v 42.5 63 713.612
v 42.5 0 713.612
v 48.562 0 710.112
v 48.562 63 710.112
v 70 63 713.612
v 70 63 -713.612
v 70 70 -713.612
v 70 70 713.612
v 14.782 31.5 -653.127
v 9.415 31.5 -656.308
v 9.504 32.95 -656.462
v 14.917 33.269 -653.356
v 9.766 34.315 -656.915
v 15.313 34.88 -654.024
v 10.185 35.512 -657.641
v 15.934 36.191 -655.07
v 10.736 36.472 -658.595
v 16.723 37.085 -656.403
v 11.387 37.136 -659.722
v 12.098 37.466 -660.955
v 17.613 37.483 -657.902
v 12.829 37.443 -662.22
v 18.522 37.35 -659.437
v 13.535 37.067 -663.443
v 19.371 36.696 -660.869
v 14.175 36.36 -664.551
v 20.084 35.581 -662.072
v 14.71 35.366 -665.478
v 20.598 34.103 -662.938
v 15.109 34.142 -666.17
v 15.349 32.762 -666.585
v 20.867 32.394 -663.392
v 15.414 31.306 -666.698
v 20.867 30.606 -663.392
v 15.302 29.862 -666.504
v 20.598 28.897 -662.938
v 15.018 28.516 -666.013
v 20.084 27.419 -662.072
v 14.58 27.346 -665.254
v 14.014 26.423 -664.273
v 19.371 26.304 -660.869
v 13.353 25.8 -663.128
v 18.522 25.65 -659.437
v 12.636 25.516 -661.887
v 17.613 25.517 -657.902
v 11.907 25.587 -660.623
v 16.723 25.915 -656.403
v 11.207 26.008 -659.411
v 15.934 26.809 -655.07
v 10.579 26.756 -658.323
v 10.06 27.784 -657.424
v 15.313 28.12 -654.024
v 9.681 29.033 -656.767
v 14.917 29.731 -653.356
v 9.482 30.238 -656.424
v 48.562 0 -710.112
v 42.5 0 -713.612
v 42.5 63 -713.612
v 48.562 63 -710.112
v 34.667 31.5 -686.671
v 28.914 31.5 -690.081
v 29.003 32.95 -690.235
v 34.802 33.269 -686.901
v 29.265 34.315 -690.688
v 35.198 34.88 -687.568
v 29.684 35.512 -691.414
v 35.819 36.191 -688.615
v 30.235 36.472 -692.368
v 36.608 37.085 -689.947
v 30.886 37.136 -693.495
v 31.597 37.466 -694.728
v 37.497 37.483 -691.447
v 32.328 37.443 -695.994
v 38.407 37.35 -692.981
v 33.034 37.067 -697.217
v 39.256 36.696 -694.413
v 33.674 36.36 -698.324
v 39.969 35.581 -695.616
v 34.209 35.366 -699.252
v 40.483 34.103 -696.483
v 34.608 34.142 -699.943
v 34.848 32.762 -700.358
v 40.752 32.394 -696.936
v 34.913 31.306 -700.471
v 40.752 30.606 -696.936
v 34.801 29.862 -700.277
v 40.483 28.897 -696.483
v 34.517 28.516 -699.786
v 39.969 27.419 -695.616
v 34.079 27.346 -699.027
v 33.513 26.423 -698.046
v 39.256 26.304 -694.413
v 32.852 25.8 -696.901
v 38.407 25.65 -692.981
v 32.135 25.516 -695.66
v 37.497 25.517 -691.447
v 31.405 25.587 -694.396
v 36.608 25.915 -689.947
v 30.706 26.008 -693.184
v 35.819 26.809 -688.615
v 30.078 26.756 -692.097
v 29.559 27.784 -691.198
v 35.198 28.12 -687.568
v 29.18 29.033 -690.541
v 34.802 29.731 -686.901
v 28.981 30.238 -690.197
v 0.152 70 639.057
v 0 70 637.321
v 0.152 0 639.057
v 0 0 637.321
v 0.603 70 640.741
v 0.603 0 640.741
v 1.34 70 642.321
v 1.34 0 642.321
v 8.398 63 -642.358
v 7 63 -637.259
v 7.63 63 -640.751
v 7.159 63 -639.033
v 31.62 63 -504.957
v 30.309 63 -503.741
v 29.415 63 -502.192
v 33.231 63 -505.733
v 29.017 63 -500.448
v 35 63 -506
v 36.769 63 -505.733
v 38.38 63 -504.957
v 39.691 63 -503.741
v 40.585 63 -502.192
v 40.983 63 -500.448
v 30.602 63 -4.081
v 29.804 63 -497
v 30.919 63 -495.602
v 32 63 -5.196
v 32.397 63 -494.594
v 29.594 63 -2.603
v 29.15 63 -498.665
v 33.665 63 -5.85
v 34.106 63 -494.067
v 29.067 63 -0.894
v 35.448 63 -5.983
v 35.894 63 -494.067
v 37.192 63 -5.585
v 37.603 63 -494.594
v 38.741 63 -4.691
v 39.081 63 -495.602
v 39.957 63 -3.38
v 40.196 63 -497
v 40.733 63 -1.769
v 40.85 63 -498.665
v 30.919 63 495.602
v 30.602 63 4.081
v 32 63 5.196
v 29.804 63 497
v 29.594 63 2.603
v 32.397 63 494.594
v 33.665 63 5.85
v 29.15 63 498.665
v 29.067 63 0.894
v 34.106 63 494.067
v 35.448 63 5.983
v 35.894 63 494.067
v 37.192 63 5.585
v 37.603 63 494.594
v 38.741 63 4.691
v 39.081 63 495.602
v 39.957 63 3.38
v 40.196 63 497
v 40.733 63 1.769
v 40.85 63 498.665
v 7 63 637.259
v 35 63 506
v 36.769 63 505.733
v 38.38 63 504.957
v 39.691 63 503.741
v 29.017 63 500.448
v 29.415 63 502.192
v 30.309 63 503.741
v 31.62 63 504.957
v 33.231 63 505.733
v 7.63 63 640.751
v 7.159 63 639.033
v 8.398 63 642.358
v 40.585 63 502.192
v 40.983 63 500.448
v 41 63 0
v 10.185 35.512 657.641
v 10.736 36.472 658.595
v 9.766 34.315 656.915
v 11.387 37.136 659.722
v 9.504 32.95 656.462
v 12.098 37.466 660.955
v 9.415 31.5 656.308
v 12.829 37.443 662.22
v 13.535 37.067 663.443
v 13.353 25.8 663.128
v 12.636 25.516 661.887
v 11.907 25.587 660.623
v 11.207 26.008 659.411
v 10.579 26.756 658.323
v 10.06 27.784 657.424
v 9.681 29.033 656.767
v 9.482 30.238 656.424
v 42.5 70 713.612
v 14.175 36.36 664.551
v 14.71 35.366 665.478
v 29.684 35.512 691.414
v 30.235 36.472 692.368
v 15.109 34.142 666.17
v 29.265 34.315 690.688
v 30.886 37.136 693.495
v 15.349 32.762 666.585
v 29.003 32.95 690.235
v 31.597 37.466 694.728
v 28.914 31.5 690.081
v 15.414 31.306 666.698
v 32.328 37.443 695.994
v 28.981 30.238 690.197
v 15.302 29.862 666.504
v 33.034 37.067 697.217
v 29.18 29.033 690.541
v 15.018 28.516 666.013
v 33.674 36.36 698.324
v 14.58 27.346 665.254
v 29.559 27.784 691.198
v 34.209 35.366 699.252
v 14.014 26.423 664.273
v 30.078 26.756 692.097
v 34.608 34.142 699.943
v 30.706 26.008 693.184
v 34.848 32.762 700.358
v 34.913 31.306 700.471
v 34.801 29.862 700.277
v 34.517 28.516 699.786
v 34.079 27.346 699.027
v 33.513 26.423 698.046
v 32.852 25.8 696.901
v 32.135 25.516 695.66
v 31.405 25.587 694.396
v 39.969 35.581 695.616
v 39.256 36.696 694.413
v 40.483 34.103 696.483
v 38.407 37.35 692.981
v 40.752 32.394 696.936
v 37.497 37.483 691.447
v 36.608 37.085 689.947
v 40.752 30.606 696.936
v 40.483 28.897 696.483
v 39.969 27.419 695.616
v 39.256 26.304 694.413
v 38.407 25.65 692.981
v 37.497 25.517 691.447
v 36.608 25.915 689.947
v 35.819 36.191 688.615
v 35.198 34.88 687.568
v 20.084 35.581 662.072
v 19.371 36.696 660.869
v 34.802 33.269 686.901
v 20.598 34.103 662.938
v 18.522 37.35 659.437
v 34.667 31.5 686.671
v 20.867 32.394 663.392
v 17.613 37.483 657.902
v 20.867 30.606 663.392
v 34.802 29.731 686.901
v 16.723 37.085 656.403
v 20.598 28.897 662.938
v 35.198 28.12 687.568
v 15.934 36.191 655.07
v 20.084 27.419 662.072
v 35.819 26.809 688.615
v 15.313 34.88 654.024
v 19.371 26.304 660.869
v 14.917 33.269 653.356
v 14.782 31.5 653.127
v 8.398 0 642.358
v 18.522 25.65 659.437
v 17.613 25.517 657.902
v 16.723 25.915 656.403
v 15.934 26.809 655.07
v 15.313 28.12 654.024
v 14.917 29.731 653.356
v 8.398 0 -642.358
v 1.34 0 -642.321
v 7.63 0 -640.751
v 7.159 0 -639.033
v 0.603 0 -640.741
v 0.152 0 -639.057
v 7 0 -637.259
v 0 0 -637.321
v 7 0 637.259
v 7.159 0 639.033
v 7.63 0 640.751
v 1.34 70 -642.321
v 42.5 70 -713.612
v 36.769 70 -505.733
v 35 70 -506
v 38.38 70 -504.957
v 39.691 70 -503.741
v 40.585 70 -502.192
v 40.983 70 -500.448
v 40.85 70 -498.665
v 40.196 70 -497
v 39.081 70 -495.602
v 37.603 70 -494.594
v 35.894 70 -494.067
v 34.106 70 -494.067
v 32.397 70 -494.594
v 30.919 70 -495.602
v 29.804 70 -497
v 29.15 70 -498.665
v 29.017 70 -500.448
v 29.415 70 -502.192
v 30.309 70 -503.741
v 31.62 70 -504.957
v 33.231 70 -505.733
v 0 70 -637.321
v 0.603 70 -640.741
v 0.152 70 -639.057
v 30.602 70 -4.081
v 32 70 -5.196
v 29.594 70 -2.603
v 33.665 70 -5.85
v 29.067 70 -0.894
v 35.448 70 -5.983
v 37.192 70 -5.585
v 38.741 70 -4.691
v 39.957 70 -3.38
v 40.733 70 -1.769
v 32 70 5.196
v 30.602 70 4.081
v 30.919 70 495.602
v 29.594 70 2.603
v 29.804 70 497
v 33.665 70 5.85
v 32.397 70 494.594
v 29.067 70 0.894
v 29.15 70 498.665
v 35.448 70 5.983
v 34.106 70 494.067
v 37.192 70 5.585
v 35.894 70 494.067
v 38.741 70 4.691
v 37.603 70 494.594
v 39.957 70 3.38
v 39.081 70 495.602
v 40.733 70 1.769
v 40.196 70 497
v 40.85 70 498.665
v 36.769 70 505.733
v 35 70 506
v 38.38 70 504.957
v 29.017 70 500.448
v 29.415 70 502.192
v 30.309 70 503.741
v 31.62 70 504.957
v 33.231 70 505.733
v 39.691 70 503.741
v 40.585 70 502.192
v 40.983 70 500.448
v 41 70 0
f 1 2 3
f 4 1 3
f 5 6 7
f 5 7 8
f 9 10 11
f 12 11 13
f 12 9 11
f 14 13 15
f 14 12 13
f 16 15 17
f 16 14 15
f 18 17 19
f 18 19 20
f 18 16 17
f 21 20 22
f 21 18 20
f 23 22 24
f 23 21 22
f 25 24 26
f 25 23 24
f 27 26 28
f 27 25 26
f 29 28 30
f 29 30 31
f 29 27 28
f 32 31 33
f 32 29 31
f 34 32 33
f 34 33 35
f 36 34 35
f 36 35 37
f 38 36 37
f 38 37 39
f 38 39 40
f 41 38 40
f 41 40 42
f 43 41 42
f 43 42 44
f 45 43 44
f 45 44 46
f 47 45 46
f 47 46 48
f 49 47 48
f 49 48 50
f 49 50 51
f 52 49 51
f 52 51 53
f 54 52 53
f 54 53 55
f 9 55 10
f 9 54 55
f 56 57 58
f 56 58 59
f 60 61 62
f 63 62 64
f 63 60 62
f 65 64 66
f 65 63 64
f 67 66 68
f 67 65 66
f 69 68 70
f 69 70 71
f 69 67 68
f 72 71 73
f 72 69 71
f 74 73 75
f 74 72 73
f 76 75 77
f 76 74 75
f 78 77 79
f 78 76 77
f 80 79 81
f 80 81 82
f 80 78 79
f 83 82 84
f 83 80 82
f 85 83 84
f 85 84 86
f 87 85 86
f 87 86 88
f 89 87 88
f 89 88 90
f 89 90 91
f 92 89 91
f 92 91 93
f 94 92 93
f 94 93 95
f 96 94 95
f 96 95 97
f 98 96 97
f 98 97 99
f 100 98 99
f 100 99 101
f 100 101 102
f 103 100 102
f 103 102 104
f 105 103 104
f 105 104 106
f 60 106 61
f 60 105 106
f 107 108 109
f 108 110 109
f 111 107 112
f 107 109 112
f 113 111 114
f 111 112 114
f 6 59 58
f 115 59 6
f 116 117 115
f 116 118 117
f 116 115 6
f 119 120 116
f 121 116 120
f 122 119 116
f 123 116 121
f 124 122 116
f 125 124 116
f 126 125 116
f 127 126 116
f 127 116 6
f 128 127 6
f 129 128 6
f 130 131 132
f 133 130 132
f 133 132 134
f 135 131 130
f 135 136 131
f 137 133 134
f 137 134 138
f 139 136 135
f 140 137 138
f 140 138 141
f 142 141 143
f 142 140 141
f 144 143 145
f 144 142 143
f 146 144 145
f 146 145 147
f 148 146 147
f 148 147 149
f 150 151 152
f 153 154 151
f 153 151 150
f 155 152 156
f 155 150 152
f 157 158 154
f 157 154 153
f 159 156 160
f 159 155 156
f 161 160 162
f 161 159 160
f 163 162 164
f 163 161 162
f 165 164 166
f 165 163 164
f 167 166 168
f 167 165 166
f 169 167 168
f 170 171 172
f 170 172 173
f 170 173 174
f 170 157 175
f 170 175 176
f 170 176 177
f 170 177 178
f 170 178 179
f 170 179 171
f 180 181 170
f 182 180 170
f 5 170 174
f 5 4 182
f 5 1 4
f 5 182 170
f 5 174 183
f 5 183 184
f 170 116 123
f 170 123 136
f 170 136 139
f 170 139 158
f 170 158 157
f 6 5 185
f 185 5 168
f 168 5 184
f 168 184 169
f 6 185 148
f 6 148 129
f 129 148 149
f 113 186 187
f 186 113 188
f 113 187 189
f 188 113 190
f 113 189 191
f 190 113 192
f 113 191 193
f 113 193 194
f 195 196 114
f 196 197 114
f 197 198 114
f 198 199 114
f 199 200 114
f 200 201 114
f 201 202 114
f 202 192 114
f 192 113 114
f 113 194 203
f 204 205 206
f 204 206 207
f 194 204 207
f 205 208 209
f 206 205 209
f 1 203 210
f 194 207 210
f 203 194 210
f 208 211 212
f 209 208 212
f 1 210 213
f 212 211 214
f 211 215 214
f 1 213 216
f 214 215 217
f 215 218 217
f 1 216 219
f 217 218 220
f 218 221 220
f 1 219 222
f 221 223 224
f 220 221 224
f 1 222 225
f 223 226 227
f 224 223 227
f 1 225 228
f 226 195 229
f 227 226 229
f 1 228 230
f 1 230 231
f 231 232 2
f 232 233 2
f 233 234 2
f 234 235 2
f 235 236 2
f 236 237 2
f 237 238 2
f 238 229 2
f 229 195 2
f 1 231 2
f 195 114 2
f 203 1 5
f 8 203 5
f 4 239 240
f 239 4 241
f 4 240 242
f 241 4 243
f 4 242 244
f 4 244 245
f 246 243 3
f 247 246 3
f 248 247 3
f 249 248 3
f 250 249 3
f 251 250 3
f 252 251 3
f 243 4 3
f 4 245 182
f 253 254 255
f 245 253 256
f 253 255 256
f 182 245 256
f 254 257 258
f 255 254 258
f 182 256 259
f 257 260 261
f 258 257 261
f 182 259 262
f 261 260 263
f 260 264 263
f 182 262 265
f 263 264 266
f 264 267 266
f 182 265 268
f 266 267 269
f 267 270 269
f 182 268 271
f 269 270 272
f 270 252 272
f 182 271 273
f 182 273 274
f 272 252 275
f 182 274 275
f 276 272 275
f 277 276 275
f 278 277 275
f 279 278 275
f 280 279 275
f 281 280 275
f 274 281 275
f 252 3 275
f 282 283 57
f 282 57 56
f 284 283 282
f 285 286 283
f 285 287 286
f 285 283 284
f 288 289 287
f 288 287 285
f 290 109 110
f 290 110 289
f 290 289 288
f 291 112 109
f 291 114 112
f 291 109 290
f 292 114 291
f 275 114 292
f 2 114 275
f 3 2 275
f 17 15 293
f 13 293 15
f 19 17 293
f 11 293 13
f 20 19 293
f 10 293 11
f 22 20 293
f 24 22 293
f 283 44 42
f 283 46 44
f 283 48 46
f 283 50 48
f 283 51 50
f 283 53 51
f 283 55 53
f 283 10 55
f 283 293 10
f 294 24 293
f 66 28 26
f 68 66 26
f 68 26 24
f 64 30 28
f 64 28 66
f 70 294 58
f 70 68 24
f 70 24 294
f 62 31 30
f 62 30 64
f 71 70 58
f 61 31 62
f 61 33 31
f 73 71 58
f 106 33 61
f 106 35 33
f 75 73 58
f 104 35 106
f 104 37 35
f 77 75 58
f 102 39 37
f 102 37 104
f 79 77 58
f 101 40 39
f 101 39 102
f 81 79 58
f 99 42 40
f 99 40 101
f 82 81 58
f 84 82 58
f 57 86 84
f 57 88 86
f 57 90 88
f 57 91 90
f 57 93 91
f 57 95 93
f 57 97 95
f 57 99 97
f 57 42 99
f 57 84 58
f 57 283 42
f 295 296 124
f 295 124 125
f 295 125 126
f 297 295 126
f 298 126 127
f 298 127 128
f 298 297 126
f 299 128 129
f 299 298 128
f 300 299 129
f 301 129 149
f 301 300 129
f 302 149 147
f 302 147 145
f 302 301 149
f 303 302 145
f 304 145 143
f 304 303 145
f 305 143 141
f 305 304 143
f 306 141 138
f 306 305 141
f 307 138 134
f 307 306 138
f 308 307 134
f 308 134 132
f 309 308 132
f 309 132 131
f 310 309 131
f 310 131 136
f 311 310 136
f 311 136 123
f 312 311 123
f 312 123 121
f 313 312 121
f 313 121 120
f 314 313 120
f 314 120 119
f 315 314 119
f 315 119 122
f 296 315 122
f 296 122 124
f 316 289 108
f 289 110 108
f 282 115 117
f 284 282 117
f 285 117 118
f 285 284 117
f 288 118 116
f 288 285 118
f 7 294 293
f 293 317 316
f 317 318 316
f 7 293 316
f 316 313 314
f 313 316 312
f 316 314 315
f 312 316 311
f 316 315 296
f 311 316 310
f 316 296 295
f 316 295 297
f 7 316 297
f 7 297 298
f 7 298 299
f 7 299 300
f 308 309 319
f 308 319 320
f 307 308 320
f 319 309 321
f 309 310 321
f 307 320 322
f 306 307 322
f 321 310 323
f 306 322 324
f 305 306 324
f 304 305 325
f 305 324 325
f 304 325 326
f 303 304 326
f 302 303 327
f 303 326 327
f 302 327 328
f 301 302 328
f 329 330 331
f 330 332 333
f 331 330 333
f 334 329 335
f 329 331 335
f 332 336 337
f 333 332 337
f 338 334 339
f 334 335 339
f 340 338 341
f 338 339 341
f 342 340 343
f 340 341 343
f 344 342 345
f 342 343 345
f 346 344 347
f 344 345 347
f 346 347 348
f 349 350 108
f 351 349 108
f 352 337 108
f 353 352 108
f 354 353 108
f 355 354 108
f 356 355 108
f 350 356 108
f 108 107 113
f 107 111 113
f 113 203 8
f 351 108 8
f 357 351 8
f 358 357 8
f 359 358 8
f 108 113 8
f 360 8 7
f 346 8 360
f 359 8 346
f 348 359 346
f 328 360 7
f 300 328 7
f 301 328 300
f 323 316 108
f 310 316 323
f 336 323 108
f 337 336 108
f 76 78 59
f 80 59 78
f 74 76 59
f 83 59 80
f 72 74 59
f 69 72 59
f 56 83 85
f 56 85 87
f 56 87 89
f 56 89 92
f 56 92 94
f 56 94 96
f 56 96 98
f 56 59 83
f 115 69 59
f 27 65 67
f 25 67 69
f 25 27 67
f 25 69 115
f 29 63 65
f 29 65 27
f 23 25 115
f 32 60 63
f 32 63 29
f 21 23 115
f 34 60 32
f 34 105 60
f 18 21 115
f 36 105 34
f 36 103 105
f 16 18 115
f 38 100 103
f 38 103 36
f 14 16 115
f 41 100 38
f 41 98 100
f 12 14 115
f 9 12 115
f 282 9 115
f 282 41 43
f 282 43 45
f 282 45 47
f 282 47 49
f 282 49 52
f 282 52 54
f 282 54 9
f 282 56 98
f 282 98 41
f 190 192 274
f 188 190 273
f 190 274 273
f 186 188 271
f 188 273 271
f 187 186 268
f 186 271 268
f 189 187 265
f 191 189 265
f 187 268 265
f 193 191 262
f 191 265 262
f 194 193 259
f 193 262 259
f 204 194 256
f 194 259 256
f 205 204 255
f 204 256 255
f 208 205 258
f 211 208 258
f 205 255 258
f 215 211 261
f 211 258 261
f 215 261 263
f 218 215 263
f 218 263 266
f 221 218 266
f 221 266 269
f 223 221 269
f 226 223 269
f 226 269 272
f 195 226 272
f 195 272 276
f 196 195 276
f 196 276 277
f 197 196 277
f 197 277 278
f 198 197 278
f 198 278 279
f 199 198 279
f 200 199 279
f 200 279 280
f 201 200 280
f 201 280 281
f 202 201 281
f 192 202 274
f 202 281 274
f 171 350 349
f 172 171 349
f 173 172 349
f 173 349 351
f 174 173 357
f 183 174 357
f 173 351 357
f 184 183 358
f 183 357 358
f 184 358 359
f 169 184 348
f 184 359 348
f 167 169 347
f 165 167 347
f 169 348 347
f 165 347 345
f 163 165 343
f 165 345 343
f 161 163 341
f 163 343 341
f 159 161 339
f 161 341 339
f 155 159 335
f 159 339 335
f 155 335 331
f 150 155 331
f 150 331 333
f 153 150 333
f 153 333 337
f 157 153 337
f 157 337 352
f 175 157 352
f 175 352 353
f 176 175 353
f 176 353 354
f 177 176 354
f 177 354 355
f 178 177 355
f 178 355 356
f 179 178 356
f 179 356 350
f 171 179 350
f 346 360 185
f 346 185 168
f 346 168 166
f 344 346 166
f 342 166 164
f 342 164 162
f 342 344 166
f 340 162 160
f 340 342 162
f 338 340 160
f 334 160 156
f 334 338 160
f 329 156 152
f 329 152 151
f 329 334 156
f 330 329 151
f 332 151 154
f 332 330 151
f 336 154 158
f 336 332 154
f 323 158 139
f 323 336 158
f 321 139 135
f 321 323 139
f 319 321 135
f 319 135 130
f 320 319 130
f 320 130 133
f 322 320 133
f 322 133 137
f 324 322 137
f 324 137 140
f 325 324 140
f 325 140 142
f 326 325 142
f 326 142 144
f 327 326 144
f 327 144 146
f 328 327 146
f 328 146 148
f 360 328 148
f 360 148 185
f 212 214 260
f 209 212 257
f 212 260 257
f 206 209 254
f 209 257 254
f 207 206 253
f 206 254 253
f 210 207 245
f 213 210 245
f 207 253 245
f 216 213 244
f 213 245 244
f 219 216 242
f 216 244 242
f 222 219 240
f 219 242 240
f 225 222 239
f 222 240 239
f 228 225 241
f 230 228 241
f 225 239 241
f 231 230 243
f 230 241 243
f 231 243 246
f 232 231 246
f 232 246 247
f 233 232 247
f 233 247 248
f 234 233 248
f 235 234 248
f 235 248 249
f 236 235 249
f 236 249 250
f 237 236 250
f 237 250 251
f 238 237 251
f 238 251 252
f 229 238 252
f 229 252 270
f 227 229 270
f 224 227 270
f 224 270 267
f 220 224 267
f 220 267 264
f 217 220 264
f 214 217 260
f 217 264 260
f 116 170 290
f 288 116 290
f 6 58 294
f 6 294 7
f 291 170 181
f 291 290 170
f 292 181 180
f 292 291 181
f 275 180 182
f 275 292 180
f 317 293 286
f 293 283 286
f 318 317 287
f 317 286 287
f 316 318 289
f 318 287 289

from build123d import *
from build123d.topology import SkipClean

# Parameters (mm, degrees)
BOSS_EXTRUDE1_DEPTH = 640
SKETCH22_R          = 6
CUT_EXTRUDE4_DEPTH  = 10
BOSS_EXTRUDE2_DEPTH = 63
BOSS_EXTRUDE3_DEPTH = 7
SKETCH26_R          = 6
CUT_EXTRUDE5_DEPTH  = 7
FILLET1_R           = 10
FILLET2_R           = 10


with BuildPart() as part:
    # Sketch1 → Boss-Extrude1 (new body)
    with BuildSketch(Plane.XY):
        Polygon((0, 0), (0, 70), (70, 70), (70, 63), (7, 63), (7, 0), align=None)
    extrude(amount=BOSS_EXTRUDE1_DEPTH)

    # Sketch22 → Cut-Extrude4 (cut)
    with BuildSketch(Plane(origin=(0, 70, 0), x_dir=(1, 0, 0), z_dir=(0, 1, 0))):
        with Locations((35, 0)):
            Circle(SKETCH22_R)
        with Locations((35, 500)):
            Circle(SKETCH22_R)
        with Locations(Location((35, -500, 0), (0, 0, 270))):
            Circle(SKETCH22_R)
    extrude(amount=-CUT_EXTRUDE4_DEPTH, mode=Mode.SUBTRACT)

    # Sketch23 → Boss-Extrude2 (add)
    with BuildSketch(Plane(origin=(0, 0, 0), x_dir=(1, 0, 0), z_dir=(0, 1, 0))):
        Polygon((0, -640), (42.5, -713.612159322), (48.562177826, -710.112159322), (7, -640), align=None)
    extrude(amount=BOSS_EXTRUDE2_DEPTH)

    # Sketch25 → Boss-Extrude3 (add)
    with BuildSketch(Plane(origin=(0, 63, 0), x_dir=(1, 0, 0), z_dir=(0, 1, 0))):
        Polygon((70, -640), (0, -640), (42.5, -713.612159322), (70, -713.612159322), align=None)
    extrude(amount=BOSS_EXTRUDE3_DEPTH)

    # Sketch26 → Cut-Extrude5 (cut)
    with BuildSketch(Plane(origin=(-275.556719825, 0, 163.348804279), x_dir=(-0.5099316128113042, 0, -0.8602149442178172), z_dir=(0.8602149442178172, 0, -0.5099316128113042))):
        with Locations((-614.36248118, 31.5)):
            Circle(SKETCH26_R)
        with Locations((-575.367085589, 31.5)):
            Circle(SKETCH26_R)
    extrude(amount=-CUT_EXTRUDE5_DEPTH, mode=Mode.SUBTRACT)

    # Mirror1: part across plane


with BuildPart() as part_1:
    with SkipClean():  # the faces are left unmerged after this step: merging them gives an invalid solid
        add(part.part)
        add(part.part.mirror(Plane.XY))

    # Fillet1
    fillet1_edges = [part_1.edges().sort_by_distance(p)[0] for p in [
        (0, 35, 640),
        (0, 35, -640),
    ]]
    fillet(fillet1_edges, radius=FILLET1_R)

    # Fillet2
    fillet2_edges = [part_1.edges().sort_by_distance(p)[0] for p in [
        (7, 31.5, -640),
        (7, 31.5, 640),
    ]]
    fillet(fillet2_edges, radius=FILLET2_R)


solid = part_1.part
